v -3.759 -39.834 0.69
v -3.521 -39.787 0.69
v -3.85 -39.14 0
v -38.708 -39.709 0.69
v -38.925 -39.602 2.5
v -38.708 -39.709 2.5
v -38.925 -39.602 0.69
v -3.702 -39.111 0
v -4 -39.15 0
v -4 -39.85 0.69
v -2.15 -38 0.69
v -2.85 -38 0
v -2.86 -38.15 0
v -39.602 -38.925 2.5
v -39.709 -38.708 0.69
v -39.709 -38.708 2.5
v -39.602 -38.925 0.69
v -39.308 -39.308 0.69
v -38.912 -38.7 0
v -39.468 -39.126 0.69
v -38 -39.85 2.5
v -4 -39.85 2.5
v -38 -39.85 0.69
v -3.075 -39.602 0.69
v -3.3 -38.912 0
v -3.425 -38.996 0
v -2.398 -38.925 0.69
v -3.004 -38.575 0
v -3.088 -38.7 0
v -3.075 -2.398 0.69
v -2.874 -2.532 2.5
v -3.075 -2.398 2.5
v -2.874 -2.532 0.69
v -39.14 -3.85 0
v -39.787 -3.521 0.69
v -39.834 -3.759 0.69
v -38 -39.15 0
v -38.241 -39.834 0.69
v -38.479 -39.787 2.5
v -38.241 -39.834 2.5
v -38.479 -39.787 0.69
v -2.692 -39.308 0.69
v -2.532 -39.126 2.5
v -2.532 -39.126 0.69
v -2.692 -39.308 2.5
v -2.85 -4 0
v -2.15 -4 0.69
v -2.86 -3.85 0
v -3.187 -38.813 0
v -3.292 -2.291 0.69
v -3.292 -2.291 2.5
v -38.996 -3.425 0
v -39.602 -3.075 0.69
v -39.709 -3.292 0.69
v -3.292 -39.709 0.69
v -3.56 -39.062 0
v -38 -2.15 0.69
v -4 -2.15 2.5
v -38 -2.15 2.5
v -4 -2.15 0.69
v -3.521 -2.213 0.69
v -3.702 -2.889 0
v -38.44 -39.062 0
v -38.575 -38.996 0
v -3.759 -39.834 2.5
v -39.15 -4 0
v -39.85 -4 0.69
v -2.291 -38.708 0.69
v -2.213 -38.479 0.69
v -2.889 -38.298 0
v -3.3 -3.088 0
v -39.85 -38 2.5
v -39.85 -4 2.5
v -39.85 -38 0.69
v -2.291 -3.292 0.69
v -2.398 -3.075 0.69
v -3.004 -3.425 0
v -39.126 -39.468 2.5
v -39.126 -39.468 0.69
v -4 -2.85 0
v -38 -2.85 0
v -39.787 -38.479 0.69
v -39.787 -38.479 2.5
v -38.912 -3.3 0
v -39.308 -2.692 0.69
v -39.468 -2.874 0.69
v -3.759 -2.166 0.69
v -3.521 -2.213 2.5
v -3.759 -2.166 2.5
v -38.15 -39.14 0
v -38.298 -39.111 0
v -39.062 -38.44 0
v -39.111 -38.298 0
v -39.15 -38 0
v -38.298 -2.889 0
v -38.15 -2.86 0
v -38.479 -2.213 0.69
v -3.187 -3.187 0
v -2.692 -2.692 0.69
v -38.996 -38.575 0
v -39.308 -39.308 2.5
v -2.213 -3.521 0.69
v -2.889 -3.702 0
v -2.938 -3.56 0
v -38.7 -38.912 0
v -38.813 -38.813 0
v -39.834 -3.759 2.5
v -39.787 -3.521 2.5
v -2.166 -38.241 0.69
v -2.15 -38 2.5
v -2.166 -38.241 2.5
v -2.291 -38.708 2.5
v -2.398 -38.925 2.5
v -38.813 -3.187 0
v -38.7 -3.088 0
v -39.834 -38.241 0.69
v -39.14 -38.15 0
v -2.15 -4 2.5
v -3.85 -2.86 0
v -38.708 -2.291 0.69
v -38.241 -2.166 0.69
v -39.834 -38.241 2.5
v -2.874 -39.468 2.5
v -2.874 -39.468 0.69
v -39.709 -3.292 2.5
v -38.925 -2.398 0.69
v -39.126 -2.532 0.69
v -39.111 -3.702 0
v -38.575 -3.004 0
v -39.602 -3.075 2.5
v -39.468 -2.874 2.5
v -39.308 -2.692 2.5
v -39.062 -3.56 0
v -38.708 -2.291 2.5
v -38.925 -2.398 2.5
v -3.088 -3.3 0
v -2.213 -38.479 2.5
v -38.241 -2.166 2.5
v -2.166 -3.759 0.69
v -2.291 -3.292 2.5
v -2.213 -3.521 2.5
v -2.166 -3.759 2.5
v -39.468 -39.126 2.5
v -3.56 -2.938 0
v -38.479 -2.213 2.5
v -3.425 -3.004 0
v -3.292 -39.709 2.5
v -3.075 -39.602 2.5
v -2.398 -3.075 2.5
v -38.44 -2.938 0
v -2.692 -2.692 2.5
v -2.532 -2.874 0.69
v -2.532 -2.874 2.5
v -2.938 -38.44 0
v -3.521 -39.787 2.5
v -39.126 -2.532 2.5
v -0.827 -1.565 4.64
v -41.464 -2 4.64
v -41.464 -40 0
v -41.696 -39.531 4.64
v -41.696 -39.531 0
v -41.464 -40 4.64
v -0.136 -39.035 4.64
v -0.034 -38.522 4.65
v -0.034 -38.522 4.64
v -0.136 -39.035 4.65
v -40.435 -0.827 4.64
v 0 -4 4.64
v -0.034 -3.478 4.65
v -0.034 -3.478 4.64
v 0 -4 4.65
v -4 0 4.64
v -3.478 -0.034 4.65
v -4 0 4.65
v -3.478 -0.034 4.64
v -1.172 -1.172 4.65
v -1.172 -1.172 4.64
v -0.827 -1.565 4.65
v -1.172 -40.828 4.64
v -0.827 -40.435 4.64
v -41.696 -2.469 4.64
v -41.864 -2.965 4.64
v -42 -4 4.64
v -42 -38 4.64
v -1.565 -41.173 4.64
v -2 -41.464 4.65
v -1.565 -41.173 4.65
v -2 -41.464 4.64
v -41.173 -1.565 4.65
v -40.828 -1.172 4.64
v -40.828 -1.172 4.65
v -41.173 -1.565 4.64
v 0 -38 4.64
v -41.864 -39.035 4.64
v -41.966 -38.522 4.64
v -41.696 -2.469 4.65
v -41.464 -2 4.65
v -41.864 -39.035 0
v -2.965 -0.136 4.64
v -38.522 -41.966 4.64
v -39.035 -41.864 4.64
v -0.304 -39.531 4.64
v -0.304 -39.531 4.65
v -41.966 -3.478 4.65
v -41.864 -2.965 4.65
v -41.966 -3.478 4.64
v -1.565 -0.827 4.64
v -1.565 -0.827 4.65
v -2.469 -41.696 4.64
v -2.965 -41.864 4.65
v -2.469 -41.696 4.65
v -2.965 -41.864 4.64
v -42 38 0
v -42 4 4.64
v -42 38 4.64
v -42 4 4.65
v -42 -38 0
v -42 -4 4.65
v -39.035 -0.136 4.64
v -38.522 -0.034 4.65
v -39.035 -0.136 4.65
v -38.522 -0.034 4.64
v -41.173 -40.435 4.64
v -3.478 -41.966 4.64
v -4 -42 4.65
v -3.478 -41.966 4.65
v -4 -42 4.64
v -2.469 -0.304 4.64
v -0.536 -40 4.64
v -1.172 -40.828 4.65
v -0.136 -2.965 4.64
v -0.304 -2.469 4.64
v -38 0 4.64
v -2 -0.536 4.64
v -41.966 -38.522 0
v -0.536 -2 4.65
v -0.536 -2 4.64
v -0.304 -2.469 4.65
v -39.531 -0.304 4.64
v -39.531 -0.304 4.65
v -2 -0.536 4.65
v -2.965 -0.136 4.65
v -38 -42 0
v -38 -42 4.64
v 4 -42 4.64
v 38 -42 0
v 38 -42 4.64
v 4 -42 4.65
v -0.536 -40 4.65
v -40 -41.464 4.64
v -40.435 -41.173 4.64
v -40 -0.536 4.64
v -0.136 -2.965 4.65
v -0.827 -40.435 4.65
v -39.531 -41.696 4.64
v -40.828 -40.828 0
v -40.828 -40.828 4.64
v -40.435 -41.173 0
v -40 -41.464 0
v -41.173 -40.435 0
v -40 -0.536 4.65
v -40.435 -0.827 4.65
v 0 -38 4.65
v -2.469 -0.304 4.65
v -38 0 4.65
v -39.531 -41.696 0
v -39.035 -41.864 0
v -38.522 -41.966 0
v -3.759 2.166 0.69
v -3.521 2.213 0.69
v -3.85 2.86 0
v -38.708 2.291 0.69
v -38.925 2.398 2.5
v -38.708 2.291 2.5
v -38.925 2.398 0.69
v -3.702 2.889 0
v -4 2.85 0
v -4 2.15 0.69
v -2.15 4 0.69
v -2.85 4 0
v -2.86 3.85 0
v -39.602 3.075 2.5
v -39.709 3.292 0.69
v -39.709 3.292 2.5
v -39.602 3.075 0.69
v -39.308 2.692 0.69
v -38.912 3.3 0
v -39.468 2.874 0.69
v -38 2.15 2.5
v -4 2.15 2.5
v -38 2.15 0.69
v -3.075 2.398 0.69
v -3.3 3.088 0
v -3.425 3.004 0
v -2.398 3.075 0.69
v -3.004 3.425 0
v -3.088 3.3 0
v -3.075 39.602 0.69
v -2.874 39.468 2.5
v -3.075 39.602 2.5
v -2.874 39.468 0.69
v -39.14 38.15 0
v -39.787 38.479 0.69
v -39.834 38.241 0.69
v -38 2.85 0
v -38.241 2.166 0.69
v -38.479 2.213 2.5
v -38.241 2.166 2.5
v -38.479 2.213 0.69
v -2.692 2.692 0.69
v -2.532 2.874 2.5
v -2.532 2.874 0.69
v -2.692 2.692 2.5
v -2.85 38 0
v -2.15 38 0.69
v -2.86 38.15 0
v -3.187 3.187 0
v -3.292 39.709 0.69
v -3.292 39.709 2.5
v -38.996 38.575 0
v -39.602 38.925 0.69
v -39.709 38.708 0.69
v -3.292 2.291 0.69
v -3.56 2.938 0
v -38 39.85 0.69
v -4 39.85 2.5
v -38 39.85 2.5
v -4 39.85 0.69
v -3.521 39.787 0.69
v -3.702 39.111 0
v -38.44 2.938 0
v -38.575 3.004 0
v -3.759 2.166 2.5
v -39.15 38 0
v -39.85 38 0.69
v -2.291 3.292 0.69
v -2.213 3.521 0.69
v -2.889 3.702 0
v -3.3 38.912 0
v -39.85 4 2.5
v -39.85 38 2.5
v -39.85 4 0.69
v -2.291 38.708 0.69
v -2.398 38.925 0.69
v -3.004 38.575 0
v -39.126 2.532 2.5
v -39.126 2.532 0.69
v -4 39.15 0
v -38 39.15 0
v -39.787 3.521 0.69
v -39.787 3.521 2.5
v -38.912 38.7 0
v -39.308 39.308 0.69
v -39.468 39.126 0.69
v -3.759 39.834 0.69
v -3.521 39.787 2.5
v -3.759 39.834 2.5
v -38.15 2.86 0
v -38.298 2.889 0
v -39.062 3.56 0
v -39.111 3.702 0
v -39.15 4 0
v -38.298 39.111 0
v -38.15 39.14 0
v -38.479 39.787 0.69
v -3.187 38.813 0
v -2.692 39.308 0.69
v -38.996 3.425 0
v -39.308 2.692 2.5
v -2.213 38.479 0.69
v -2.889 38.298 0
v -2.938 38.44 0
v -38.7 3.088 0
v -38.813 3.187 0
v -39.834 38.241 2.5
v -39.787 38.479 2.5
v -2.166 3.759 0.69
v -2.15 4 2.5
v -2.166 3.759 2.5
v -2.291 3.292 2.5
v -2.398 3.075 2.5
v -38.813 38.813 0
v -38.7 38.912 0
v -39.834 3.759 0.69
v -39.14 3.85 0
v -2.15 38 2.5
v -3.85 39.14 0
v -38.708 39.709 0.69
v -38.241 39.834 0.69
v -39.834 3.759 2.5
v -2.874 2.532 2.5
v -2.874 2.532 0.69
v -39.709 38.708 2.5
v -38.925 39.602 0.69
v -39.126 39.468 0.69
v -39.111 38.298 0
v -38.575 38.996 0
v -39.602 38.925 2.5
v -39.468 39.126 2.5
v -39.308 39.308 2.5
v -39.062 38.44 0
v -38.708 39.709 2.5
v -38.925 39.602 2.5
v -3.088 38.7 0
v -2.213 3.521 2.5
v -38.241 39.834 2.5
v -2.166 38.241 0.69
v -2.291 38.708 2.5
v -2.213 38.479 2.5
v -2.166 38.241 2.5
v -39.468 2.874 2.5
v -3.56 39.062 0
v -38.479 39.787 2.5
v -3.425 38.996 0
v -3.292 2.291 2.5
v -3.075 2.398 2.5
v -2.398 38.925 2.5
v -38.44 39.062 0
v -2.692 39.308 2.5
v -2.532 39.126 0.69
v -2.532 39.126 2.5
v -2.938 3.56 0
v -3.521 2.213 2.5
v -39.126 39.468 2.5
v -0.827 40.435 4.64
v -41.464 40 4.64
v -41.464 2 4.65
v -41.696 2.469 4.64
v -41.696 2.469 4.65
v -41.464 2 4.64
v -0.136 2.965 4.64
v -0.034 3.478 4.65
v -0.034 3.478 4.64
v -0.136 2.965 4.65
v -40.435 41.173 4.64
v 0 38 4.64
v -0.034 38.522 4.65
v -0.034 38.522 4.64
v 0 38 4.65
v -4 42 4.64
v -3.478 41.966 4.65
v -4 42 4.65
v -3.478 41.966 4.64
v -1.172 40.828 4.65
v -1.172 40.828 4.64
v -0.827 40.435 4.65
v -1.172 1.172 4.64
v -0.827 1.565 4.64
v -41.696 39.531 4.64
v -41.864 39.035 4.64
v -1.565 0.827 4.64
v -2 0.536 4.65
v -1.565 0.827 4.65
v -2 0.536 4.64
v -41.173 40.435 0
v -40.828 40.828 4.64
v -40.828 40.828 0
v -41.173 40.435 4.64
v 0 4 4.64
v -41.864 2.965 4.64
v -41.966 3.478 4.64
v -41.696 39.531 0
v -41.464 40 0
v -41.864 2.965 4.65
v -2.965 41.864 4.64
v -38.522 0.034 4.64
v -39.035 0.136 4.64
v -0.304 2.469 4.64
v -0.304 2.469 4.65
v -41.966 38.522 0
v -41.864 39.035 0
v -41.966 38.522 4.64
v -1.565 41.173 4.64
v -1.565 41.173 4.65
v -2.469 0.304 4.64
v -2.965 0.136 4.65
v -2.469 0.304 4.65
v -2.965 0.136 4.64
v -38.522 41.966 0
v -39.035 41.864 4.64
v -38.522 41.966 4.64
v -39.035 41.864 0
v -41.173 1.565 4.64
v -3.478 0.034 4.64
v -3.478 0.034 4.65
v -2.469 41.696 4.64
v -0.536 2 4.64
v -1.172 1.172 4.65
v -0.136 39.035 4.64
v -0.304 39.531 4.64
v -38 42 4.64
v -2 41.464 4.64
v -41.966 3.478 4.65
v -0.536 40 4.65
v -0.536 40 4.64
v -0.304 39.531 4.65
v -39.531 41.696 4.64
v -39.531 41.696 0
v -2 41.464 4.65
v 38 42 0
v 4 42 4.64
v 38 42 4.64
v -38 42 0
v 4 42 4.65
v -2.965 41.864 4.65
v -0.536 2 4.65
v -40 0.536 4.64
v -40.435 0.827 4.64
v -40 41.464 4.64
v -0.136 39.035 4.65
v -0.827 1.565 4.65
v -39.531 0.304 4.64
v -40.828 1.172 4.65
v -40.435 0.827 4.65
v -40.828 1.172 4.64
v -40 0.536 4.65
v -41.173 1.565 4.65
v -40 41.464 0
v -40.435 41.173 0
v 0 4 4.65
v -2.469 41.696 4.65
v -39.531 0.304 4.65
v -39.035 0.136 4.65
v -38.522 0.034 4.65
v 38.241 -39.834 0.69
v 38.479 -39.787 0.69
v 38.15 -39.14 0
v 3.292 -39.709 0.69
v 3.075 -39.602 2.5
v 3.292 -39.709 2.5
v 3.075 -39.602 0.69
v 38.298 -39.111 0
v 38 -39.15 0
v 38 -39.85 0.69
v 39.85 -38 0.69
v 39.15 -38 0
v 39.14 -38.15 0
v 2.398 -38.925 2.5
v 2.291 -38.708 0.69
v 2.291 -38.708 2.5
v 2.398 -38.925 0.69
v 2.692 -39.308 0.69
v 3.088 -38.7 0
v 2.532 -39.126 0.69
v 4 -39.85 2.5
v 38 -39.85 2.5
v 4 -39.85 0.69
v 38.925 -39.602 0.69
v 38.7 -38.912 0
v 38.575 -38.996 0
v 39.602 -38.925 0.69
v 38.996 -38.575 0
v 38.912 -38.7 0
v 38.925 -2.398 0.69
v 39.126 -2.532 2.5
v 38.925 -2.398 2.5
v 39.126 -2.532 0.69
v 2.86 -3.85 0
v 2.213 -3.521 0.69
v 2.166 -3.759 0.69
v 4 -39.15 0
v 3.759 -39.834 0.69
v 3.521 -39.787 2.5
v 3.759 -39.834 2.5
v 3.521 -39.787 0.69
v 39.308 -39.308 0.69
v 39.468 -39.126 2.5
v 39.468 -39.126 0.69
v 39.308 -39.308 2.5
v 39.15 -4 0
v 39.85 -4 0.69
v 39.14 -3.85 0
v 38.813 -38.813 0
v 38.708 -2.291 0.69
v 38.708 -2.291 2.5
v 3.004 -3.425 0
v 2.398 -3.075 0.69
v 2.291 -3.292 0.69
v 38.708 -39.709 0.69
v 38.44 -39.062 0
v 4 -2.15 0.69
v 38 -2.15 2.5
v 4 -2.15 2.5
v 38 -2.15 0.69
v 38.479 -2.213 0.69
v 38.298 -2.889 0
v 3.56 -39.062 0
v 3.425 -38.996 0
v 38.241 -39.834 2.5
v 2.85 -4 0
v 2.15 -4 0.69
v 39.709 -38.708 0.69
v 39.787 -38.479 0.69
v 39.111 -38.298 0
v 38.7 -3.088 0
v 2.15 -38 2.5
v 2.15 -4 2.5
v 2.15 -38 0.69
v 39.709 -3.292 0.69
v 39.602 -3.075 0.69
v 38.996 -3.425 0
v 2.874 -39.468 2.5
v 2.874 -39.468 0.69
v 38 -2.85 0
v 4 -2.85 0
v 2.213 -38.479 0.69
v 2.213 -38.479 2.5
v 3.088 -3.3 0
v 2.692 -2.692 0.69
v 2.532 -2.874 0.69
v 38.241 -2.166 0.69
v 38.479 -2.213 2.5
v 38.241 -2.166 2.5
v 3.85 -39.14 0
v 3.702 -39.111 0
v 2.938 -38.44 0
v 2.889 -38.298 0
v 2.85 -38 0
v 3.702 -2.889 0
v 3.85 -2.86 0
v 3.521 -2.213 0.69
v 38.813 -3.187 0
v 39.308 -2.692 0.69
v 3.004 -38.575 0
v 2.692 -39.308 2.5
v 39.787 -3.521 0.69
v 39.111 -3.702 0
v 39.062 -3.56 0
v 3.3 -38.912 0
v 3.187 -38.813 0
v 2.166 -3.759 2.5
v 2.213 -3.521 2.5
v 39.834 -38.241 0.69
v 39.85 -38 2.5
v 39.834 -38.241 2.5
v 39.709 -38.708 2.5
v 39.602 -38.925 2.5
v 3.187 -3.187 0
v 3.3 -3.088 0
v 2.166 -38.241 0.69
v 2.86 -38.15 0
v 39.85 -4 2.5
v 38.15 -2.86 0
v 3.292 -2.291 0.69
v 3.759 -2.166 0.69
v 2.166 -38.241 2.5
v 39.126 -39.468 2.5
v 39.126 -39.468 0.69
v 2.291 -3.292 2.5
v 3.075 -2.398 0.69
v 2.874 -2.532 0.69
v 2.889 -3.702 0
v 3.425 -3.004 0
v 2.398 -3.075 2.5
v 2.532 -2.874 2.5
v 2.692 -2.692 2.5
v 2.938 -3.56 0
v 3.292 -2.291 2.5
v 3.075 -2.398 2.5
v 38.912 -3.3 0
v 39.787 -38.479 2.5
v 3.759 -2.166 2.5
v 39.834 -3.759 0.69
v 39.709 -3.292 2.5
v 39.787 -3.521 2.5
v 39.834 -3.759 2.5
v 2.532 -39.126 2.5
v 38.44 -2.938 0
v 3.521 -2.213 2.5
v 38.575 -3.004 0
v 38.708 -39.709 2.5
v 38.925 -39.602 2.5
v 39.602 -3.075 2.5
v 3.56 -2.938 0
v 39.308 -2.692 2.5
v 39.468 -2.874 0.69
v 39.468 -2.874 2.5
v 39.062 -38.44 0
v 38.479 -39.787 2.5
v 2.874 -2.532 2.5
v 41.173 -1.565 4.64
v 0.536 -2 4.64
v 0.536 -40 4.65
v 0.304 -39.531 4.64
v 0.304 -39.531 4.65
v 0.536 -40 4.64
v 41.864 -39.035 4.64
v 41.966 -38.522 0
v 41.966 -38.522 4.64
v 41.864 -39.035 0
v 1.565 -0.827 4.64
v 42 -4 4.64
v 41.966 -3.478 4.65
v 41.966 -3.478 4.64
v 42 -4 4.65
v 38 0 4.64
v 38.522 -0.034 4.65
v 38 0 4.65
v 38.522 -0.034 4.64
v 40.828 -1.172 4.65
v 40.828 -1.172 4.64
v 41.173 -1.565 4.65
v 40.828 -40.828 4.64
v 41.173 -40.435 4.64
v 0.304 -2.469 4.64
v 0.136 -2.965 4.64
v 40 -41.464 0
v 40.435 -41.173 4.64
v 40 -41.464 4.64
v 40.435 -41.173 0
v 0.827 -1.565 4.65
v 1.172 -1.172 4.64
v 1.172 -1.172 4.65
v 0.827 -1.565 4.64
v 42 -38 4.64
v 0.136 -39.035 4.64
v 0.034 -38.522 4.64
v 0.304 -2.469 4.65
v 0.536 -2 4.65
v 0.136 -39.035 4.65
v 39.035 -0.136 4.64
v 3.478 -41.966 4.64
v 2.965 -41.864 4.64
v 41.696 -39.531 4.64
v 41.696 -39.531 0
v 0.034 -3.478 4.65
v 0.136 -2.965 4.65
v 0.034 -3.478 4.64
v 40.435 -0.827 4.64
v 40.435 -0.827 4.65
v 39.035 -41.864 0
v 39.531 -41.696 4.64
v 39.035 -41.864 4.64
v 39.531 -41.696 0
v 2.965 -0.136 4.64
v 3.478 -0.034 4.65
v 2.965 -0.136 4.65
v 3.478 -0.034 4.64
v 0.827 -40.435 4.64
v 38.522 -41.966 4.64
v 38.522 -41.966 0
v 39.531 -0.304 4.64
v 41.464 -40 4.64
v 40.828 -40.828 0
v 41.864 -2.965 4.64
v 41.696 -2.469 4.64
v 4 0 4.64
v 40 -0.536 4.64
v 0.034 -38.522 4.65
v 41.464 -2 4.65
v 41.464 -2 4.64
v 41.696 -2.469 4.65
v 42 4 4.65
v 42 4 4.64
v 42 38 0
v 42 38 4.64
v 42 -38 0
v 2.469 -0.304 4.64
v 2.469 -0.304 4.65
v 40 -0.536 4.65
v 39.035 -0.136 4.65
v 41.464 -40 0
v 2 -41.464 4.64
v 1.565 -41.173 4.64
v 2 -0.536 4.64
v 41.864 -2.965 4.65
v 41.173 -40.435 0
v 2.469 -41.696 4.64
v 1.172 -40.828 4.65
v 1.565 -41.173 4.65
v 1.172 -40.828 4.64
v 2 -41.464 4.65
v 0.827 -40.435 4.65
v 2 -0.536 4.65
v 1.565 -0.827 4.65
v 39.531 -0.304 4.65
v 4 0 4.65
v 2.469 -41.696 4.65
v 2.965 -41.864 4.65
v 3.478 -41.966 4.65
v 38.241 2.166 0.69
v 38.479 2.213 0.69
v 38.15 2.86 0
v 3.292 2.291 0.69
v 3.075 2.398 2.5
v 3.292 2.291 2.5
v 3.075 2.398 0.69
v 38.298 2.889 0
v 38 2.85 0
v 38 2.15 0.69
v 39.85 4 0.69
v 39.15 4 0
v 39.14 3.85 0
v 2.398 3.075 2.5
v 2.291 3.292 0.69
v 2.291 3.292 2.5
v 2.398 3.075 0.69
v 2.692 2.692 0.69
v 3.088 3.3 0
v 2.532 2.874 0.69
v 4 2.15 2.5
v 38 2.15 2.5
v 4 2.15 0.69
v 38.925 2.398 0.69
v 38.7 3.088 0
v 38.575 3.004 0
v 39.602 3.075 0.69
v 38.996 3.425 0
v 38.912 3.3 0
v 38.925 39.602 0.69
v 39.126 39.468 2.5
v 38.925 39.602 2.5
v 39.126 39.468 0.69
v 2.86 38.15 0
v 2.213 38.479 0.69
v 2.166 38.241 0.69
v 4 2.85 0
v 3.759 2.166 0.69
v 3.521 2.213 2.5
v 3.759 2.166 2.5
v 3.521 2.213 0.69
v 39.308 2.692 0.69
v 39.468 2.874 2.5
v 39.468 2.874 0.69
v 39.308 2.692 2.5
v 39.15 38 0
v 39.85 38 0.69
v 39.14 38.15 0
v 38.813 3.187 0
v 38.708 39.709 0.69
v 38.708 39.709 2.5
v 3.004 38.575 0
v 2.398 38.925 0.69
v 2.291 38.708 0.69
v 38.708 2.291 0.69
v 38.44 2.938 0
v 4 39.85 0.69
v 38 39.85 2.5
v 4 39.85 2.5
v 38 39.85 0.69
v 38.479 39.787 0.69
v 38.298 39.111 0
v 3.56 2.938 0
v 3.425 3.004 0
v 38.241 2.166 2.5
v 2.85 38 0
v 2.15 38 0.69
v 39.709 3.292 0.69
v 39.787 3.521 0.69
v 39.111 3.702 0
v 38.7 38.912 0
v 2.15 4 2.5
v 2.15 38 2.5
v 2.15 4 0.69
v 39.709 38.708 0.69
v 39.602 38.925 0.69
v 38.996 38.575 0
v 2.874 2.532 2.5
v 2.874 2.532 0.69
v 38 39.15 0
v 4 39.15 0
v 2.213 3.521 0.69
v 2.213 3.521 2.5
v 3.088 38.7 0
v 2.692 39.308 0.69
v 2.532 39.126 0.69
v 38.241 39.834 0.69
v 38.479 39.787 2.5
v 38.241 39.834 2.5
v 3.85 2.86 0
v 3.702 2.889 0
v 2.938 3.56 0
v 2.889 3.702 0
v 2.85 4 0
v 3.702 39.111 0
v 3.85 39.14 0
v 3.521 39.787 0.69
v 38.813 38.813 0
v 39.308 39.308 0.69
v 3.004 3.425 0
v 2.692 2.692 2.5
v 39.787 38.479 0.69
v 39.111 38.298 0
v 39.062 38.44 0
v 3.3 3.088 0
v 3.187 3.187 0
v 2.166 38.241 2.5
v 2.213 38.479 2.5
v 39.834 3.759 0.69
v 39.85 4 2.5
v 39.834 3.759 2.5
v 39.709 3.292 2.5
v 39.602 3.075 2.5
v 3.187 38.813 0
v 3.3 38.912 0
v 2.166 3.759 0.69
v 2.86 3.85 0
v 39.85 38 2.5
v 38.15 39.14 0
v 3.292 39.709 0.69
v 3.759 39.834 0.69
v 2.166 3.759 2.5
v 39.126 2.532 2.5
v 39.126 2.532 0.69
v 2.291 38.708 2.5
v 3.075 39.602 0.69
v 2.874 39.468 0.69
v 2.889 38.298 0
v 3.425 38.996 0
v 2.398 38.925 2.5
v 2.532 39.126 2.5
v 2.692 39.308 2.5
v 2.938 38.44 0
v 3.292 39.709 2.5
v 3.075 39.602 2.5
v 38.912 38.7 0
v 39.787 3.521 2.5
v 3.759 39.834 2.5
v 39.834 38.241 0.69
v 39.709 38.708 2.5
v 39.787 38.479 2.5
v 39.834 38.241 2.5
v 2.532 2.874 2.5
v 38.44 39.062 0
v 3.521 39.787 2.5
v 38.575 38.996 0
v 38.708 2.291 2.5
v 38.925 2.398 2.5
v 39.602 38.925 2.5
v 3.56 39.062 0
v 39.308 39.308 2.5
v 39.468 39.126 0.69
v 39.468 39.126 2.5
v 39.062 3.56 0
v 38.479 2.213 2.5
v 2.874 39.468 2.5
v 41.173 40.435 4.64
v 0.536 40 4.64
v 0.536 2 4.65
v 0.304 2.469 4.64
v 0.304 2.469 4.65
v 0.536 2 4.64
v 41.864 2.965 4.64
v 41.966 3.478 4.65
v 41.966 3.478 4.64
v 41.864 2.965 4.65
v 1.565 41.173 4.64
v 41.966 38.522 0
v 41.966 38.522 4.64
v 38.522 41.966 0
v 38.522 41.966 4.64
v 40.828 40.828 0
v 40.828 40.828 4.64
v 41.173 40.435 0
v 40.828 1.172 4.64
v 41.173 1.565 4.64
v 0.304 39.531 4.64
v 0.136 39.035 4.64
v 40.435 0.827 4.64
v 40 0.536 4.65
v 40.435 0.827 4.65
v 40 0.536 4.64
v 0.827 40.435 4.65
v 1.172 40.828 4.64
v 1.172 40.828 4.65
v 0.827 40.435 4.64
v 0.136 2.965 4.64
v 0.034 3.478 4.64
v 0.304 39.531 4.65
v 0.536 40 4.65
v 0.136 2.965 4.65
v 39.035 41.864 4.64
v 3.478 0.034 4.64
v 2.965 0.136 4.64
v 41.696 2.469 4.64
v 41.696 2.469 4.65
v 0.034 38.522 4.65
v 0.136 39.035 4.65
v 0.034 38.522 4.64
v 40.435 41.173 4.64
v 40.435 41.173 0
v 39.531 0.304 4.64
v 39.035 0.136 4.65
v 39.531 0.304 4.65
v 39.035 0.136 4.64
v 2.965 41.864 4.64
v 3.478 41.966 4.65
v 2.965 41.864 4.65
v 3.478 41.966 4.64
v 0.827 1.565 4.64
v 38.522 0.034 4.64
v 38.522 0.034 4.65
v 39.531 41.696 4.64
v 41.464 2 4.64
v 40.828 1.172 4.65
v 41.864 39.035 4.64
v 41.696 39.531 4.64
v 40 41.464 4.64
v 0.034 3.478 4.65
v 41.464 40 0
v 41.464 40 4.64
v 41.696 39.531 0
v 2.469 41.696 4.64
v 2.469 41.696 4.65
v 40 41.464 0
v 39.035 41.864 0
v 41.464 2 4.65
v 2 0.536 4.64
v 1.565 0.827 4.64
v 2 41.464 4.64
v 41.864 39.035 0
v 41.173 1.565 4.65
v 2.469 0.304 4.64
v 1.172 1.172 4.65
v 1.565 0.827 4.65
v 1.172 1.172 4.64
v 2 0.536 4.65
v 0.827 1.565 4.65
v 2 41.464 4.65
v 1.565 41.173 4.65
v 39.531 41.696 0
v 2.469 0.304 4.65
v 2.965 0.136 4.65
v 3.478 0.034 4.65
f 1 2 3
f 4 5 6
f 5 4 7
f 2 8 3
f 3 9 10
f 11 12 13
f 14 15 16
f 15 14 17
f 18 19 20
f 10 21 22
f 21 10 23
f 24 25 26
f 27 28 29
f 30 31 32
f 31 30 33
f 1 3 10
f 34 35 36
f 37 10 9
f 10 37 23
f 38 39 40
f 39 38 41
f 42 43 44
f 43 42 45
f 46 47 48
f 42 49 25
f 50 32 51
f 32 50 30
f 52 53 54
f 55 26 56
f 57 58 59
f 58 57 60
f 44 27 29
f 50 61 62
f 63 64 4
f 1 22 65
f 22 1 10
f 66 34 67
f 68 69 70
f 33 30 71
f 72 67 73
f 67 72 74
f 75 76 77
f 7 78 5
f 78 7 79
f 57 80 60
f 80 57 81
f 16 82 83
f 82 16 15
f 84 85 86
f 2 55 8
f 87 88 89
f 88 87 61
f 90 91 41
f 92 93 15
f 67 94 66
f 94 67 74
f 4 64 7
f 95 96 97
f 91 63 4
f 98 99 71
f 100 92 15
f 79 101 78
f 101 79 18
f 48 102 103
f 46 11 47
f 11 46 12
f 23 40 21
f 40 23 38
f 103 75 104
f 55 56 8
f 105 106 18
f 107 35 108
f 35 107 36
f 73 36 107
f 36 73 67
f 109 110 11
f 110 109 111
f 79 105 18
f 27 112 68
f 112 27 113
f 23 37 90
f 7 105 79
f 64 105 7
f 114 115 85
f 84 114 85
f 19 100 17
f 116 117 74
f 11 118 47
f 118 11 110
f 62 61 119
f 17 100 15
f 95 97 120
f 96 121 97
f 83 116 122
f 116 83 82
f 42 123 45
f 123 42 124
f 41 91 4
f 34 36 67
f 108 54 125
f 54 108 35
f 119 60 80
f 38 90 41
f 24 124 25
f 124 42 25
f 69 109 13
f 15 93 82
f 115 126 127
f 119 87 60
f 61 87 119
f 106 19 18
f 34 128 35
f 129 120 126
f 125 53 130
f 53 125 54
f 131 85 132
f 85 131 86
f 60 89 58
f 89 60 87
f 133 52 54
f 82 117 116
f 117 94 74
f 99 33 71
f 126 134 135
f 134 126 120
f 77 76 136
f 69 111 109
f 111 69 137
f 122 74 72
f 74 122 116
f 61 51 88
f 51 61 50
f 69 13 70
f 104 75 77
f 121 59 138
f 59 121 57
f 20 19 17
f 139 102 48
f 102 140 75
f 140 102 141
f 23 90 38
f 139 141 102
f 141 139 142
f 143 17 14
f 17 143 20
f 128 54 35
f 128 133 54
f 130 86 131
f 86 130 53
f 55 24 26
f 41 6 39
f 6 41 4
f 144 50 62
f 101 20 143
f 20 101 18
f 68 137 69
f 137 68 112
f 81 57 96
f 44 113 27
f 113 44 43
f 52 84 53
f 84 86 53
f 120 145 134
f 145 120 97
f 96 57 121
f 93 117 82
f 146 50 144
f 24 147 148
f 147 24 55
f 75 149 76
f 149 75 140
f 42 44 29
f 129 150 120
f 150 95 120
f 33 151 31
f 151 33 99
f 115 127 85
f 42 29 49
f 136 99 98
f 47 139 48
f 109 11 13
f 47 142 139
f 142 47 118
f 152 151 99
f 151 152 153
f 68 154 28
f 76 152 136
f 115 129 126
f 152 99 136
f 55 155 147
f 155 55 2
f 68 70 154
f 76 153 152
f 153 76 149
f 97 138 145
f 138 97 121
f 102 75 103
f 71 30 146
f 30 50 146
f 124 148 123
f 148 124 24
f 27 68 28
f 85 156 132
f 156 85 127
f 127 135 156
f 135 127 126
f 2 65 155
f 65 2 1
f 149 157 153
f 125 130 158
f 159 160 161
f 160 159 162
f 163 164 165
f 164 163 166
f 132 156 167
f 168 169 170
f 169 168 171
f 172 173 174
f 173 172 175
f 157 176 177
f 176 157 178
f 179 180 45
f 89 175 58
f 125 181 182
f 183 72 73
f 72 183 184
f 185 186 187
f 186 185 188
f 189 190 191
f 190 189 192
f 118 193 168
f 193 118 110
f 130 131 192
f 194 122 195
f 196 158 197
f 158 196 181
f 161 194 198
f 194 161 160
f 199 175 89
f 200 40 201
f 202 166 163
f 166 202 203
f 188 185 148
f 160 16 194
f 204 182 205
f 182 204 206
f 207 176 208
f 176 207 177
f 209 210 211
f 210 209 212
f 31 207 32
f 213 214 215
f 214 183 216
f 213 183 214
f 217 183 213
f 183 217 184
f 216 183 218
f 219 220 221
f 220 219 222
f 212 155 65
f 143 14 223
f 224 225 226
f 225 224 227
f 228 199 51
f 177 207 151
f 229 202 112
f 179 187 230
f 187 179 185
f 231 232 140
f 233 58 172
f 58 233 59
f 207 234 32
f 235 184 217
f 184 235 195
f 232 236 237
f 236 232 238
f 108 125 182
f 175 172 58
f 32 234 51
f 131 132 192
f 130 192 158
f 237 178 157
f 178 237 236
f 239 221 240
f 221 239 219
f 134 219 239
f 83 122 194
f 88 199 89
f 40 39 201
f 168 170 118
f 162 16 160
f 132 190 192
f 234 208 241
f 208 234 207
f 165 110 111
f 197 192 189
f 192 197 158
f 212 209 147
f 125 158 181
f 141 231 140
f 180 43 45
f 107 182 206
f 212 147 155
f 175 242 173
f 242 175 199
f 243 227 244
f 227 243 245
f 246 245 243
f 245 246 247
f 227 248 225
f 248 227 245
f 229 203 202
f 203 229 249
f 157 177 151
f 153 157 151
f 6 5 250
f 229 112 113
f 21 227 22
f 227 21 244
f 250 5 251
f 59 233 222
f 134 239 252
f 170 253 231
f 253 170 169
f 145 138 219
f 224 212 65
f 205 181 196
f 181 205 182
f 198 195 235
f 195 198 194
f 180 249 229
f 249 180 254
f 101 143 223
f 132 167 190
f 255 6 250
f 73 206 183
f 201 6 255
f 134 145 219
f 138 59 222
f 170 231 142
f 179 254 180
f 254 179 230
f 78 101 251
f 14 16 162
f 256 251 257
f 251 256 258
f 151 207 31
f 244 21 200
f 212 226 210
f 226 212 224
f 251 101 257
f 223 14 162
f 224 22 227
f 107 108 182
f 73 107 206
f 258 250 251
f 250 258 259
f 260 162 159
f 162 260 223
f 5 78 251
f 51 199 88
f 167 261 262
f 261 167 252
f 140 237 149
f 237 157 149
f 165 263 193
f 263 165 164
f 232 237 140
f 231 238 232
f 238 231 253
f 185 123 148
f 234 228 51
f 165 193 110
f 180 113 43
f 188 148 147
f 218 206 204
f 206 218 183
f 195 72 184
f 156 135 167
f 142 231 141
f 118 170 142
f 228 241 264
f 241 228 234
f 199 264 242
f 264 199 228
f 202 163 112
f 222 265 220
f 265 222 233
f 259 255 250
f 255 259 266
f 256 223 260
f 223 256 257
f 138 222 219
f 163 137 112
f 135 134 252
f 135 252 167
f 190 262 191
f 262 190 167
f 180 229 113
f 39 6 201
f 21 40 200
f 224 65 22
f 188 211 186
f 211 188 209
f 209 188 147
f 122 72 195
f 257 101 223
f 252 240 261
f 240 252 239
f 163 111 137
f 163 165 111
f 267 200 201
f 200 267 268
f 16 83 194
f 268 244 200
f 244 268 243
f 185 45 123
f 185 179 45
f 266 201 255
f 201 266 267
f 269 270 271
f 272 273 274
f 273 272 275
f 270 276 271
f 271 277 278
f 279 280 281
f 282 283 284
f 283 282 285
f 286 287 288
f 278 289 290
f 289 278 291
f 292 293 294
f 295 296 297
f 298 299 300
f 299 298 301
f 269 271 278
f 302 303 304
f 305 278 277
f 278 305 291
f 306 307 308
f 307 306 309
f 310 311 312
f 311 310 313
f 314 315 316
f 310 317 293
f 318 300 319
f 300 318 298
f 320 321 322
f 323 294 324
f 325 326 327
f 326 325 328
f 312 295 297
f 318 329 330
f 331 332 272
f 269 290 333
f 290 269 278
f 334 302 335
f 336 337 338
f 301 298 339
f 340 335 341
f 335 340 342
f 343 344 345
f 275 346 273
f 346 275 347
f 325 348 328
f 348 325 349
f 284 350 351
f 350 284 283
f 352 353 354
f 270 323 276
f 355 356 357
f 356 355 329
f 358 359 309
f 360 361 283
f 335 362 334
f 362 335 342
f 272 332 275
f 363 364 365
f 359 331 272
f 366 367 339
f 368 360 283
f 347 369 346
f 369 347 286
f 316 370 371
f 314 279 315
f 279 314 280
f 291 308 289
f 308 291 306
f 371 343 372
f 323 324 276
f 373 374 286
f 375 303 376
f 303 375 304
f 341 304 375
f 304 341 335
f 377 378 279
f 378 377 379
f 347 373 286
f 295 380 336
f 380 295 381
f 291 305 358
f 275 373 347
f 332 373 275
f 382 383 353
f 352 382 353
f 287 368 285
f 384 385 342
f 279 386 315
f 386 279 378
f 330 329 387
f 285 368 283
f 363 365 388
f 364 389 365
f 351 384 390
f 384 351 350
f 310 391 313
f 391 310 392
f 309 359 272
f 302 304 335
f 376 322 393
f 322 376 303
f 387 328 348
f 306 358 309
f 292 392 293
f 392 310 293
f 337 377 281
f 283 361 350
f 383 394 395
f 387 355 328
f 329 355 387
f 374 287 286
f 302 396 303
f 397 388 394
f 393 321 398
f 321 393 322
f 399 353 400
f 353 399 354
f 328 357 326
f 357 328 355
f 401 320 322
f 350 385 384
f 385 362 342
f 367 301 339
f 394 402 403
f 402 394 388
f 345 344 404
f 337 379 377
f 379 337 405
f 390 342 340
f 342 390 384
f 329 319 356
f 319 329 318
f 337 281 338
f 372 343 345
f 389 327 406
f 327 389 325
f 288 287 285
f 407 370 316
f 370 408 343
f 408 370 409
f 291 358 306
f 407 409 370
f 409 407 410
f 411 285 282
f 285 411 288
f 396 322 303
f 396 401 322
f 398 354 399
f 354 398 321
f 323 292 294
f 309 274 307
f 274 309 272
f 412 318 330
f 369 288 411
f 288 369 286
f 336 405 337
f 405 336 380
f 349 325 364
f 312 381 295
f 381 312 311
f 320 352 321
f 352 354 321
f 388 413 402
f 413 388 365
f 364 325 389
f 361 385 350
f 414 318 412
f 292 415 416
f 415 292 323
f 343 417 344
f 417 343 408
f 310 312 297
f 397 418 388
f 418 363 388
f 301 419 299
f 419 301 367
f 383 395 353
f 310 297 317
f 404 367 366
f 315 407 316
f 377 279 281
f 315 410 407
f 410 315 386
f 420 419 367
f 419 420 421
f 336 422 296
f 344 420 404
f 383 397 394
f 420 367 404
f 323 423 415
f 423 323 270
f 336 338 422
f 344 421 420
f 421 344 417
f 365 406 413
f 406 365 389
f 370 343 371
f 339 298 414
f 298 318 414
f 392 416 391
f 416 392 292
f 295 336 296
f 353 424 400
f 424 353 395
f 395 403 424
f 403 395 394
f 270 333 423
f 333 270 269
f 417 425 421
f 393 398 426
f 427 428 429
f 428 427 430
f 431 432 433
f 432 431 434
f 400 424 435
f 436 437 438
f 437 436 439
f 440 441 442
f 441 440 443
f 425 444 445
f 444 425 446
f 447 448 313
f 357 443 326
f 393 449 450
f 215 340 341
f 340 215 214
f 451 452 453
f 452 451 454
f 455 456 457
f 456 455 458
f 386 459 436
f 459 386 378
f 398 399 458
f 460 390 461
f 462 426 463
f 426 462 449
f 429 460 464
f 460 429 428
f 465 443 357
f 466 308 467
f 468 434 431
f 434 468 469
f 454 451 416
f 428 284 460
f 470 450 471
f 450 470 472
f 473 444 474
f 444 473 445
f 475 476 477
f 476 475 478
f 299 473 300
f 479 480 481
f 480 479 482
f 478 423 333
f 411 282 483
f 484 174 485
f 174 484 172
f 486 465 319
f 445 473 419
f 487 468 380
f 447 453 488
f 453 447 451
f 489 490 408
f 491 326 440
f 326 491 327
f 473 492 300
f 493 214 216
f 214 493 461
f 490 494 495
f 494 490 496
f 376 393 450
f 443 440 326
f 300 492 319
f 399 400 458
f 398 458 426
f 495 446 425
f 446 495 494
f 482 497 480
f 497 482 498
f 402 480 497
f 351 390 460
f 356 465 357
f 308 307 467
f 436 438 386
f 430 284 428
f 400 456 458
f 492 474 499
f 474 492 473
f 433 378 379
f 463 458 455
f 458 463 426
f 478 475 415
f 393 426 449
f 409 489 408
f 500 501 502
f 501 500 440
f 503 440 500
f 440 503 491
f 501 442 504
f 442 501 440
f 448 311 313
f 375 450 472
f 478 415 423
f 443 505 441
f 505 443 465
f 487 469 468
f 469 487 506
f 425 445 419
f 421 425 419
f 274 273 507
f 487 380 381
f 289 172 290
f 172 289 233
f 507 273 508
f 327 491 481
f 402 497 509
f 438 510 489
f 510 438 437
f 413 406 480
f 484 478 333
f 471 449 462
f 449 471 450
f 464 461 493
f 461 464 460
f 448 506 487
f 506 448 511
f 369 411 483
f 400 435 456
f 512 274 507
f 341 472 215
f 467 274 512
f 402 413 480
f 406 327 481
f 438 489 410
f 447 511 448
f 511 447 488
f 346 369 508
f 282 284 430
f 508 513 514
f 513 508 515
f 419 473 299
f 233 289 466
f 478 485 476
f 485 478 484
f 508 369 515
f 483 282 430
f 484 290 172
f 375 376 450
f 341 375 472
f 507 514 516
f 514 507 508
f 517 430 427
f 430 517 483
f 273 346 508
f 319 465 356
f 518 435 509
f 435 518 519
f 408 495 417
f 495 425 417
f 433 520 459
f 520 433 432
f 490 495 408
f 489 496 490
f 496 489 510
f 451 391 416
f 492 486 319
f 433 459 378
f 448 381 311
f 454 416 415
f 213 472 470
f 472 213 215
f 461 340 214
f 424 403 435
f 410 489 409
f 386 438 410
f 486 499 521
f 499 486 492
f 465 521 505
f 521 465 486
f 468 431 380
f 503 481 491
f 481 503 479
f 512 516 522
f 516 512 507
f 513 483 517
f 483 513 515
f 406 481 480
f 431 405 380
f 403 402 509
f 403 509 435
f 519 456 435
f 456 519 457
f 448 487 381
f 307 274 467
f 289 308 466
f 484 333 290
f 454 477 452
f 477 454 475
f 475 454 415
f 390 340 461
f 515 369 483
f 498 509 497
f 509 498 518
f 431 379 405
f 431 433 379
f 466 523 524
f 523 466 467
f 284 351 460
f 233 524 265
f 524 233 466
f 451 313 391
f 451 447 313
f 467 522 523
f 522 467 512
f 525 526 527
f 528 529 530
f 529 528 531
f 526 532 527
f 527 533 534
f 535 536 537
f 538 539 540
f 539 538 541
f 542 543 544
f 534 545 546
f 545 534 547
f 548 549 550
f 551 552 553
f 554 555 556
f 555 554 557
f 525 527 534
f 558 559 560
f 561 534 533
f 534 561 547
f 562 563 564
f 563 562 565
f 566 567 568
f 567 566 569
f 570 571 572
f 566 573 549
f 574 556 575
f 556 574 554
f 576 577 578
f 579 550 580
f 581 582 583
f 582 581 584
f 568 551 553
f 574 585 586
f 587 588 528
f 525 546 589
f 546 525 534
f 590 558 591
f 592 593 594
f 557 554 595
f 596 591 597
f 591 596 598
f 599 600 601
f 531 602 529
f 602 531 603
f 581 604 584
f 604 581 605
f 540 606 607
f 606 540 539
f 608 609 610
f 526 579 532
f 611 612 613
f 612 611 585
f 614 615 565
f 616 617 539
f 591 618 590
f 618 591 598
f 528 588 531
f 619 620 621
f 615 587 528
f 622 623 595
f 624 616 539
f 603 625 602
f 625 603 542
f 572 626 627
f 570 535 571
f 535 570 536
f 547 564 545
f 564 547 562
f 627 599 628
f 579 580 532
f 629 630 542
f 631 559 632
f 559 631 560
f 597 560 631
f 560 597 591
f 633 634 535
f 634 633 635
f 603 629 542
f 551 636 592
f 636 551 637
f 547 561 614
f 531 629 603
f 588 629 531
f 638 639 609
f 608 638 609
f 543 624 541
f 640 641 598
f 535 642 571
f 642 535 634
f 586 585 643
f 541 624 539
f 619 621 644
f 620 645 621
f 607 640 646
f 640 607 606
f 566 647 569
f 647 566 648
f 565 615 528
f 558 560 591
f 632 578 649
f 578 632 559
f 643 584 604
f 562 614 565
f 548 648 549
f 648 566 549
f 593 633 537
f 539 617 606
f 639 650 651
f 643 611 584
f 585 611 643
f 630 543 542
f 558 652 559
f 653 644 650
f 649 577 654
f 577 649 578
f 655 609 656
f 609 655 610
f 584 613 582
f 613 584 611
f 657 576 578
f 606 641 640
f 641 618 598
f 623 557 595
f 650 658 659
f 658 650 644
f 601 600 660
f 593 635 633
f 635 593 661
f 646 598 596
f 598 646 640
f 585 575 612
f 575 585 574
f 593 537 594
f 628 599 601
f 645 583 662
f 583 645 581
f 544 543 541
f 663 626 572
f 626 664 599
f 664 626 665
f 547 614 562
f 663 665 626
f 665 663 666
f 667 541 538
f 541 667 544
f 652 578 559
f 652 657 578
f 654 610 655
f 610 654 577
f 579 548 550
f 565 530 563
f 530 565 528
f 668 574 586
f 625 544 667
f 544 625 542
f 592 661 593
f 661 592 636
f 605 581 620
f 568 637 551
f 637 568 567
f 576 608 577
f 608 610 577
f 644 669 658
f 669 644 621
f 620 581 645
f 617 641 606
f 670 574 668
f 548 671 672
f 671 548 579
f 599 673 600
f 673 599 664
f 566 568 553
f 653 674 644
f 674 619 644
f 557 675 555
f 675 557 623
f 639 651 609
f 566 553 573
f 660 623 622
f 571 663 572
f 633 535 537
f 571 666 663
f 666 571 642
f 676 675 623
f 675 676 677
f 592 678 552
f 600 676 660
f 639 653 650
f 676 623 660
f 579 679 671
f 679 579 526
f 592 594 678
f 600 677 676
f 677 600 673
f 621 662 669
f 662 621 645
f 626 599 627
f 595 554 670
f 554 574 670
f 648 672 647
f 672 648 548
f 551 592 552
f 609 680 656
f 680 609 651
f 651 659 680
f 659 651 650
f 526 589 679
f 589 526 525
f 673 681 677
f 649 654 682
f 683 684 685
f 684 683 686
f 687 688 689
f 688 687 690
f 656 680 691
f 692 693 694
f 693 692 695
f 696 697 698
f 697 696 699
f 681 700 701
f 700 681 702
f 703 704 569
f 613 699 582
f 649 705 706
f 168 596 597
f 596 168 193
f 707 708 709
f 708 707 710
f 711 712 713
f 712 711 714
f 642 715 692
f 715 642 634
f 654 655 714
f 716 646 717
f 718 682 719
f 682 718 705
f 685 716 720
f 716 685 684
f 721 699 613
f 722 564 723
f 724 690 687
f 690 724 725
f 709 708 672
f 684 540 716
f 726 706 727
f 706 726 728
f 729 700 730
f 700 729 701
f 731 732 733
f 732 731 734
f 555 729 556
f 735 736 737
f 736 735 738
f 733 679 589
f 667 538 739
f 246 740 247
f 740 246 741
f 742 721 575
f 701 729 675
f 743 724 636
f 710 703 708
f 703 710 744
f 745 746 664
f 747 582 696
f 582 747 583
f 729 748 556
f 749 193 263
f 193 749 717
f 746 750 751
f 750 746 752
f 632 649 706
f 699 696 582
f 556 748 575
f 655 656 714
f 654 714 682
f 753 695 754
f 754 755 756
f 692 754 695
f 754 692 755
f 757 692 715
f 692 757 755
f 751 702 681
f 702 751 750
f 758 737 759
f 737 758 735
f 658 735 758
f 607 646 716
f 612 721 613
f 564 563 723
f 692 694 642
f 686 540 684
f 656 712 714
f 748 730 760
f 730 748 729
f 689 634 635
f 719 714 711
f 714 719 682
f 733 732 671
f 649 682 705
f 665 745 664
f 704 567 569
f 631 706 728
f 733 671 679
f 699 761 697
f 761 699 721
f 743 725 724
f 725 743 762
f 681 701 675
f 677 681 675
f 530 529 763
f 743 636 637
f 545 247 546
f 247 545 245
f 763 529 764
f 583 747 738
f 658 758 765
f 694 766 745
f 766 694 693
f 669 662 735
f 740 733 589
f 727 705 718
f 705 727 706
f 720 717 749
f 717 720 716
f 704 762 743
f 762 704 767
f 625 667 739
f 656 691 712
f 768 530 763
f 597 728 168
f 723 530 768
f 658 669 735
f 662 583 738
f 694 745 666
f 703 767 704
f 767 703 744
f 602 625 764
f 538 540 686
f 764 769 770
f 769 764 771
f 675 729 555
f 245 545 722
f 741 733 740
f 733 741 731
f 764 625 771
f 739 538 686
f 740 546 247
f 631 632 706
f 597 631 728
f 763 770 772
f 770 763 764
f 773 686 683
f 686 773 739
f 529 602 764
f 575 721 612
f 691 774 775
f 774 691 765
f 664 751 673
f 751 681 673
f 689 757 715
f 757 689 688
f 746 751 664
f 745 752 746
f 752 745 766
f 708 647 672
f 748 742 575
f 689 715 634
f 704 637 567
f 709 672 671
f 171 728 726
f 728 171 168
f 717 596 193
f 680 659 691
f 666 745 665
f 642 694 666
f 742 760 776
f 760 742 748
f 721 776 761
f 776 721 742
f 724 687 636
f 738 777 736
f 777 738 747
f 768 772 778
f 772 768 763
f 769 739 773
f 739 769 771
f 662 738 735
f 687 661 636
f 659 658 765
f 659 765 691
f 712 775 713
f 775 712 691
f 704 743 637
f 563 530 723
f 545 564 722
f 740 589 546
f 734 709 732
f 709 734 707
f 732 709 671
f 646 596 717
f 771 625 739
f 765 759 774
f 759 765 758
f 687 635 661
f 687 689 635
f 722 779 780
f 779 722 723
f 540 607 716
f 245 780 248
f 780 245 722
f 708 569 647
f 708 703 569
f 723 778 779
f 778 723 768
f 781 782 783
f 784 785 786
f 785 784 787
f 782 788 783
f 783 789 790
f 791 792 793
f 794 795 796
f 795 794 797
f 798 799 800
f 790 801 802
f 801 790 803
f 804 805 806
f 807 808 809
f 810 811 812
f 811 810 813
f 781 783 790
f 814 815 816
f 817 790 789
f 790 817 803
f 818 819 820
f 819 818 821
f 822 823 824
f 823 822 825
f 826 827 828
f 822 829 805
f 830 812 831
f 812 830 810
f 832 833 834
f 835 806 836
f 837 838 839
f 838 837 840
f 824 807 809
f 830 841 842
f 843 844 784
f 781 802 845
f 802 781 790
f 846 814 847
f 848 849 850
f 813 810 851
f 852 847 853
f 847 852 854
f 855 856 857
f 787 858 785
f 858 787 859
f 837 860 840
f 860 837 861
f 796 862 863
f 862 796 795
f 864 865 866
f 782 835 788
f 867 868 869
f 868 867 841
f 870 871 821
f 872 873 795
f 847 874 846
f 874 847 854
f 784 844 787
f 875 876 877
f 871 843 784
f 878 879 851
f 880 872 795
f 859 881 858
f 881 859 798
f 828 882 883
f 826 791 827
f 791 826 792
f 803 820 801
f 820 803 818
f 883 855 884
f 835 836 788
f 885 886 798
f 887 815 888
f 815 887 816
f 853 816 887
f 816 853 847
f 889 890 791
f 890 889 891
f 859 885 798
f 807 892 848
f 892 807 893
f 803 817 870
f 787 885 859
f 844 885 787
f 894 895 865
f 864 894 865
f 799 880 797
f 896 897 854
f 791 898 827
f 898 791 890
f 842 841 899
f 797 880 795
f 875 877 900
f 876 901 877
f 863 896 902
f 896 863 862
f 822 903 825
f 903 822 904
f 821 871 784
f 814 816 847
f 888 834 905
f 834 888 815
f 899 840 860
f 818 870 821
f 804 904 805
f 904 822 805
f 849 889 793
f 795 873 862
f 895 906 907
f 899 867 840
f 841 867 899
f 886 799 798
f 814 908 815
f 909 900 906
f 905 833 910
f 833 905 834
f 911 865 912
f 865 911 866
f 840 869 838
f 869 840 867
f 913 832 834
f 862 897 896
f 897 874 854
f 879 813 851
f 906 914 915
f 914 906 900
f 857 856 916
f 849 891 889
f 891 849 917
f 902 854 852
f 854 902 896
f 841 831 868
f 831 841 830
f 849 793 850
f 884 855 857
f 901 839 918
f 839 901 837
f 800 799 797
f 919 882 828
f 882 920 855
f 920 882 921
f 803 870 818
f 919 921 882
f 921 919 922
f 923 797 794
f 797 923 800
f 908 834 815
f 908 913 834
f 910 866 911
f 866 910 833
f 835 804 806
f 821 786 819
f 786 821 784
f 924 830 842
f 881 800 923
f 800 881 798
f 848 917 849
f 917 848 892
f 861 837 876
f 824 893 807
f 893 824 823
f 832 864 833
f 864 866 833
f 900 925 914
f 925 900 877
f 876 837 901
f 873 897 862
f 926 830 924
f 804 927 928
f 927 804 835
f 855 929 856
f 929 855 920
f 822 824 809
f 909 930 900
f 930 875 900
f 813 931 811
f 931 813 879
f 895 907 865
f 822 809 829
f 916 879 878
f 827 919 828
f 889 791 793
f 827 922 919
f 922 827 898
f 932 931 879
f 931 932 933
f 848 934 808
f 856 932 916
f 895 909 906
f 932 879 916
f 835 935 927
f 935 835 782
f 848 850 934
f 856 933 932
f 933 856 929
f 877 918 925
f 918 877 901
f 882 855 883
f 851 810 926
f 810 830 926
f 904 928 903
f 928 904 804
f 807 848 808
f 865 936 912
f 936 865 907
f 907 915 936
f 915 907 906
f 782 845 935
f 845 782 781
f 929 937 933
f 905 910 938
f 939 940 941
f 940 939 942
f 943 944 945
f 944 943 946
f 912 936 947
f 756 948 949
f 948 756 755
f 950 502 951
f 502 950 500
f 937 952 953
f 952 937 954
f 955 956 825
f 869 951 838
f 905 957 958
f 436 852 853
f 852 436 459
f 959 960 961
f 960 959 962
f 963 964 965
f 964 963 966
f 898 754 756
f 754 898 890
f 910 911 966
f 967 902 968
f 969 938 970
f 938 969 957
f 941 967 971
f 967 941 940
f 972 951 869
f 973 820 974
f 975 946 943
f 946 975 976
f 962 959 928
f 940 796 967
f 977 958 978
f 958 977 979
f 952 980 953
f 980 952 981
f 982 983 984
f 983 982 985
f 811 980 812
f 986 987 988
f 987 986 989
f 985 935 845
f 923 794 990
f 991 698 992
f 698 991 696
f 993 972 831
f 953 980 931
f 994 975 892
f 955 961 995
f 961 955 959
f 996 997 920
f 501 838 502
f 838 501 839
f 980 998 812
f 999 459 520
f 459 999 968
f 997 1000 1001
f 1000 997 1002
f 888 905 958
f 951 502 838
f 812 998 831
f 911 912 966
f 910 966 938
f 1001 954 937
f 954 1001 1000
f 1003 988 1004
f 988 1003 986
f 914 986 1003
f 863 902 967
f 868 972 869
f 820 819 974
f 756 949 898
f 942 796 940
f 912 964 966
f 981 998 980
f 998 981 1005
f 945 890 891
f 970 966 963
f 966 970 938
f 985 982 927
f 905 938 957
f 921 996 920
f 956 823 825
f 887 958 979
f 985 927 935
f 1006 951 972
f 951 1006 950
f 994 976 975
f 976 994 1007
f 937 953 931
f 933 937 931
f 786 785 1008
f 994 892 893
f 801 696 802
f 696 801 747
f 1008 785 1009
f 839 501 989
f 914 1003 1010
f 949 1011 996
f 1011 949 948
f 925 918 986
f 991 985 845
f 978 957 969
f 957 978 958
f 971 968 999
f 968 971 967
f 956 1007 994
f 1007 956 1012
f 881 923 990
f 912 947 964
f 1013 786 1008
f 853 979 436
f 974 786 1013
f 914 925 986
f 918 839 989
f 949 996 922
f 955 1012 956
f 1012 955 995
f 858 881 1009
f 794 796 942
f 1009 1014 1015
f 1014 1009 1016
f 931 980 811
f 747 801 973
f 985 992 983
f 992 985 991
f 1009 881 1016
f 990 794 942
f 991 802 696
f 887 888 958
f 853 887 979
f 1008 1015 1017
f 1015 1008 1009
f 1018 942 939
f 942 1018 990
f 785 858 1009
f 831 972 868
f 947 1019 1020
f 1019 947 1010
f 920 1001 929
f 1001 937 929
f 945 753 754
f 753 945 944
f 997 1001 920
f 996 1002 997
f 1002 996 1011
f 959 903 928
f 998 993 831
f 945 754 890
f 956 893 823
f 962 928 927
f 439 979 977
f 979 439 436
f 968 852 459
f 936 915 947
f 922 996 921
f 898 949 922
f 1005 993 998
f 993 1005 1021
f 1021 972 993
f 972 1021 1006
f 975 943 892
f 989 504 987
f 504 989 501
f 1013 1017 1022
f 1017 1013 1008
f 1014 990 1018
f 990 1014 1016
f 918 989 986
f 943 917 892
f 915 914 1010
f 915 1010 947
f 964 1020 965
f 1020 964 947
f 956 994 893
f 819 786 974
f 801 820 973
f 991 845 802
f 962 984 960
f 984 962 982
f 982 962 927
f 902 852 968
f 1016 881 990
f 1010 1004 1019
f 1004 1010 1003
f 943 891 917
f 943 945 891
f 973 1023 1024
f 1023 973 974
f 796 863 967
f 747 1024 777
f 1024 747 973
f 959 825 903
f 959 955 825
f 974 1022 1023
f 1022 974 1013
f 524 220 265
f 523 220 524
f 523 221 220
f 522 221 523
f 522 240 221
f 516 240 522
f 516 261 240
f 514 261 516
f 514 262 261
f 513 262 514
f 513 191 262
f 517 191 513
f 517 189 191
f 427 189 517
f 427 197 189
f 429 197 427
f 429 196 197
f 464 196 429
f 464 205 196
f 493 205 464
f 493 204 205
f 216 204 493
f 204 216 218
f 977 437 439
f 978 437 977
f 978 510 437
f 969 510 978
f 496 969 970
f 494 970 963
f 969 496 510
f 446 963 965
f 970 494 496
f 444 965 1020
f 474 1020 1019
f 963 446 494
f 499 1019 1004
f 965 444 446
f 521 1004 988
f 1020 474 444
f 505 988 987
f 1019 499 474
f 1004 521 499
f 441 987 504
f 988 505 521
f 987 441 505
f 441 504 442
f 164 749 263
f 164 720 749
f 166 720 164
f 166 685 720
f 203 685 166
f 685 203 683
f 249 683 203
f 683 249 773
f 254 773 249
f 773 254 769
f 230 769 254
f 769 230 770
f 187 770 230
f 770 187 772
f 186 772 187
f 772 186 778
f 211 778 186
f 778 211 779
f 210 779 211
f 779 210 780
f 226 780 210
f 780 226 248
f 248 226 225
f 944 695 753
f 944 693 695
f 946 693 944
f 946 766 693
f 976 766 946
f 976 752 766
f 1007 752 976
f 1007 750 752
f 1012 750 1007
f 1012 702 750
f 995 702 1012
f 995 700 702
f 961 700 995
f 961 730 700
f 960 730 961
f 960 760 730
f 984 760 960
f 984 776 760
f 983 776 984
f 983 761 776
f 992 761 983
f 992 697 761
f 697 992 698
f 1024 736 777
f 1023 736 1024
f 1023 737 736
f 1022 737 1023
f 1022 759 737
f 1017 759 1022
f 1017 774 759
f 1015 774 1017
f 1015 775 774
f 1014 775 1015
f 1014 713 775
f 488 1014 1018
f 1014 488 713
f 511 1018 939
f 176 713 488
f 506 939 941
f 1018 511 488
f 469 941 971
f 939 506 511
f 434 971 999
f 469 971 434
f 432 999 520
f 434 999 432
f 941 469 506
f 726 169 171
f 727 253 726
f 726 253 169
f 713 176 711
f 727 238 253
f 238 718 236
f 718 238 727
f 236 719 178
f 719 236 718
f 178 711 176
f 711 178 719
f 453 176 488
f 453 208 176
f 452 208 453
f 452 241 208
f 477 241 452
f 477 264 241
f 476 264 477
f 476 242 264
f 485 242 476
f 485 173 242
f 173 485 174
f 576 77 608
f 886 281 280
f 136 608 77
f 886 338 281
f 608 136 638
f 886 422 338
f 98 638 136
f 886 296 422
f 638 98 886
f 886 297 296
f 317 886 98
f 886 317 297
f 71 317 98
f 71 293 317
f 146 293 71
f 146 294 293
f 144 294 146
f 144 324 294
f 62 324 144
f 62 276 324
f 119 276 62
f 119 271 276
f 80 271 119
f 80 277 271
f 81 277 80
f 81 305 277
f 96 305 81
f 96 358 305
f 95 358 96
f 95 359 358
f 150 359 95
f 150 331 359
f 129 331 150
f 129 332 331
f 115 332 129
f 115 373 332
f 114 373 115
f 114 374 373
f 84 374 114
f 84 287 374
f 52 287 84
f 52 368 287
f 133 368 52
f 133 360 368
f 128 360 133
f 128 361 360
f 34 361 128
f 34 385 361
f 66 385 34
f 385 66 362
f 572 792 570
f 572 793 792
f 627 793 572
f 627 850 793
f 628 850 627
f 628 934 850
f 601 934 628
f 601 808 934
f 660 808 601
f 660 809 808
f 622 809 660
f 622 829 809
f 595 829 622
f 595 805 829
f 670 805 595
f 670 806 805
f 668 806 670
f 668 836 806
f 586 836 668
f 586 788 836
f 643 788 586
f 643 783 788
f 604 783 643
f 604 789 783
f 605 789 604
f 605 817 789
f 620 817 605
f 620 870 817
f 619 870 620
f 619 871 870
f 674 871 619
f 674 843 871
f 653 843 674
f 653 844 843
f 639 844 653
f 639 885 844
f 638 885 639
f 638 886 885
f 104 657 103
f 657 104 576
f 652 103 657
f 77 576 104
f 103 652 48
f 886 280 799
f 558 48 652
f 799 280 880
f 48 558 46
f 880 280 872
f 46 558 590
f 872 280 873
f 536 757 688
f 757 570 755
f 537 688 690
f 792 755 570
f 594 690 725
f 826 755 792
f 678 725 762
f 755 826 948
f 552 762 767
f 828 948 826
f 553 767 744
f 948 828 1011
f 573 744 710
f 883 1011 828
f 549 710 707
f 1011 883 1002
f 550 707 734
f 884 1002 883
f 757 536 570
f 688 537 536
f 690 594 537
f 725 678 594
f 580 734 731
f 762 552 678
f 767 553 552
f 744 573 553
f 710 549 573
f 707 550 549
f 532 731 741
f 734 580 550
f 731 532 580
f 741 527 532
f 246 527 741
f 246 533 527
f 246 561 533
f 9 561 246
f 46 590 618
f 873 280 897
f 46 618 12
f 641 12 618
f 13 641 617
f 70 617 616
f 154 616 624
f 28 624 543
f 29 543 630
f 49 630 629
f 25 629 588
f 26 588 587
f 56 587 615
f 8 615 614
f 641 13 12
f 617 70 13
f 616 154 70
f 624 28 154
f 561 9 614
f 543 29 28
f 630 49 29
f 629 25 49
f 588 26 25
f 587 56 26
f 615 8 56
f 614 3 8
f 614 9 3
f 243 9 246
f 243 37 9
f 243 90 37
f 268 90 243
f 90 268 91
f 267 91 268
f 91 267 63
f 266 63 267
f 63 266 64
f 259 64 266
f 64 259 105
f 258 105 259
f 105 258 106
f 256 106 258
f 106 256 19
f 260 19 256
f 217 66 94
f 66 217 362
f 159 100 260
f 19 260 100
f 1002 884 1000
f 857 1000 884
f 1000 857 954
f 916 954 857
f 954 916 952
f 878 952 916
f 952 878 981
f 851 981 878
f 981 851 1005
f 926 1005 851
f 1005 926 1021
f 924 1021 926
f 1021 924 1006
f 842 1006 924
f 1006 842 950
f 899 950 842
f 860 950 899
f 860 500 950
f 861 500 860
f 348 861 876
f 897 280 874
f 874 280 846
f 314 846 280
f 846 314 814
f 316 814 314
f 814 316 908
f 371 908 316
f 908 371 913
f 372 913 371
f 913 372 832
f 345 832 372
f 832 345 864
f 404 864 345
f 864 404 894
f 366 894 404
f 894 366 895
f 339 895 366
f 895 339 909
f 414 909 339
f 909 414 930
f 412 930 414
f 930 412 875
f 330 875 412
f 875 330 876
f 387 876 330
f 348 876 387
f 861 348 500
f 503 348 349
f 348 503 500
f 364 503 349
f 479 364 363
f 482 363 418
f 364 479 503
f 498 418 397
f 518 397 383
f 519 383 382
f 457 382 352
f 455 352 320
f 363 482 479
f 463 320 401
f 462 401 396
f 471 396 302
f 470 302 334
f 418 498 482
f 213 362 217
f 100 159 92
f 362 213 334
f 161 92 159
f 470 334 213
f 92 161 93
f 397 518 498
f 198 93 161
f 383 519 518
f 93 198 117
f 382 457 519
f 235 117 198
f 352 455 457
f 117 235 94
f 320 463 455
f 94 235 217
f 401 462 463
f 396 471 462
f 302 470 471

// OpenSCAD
// file: ../lib/profile.scad
// Shared geometry: the foot and socket shapes every part is built from.
include <constants.scad>

// 2D rectangle of the given outer size with rounded corners, centred on the origin.
module rounded_rect(size, r) {
    offset(r = r) square([size.x - 2 * r, size.y - 2 * r], center = true);
}

// Solid whose outline shrinks with height according to `profile`,
// a bottom-to-top list of [z, inset from `size`]. Corner radius follows the inset.
module stepped_solid(size, r, profile) {
    for (i = [0 : len(profile) - 2]) {
        a = profile[i];
        b = profile[i + 1];
        hull() {
            translate([0, 0, a[0]])
                linear_extrude(EPS) rounded_rect(size - 2 * [a[1], a[1]], r - a[1]);
            translate([0, 0, b[0] - EPS])
                linear_extrude(EPS) rounded_rect(size - 2 * [b[1], b[1]], r - b[1]);
        }
    }
}

// One bin foot, sitting on z = 0, centred on its cell.
module foot() {
    stepped_solid([GRID - CLEARANCE, GRID - CLEARANCE], BIN_R, FOOT_PROFILE);
}

// Negative volume a foot drops into. `size` is the full grid area it spans.
// With through = true it is extended above and below so it cuts clean through a plate.
module socket(size = [GRID, GRID], through = false) {
    lo = SOCKET_PROFILE[0];
    hi = SOCKET_PROFILE[len(SOCKET_PROFILE) - 1];
    profile = through
        ? concat([[lo[0] - 1, lo[1]]], SOCKET_PROFILE, [[hi[0] + 1, hi[1]]])
        : SOCKET_PROFILE;
    stepped_solid(size, SOCKET_R, profile);
}

// Repeat children once per cell of an nx-by-ny grid centred on the origin.
module grid_copies(nx, ny) {
    for (i = [0 : nx - 1], j = [0 : ny - 1])
        translate([(i - (nx - 1) / 2) * GRID, (j - (ny - 1) / 2) * GRID, 0])
            children();
}
// file: ../lib/printer.scad
// Printer limits and the logic for splitting large parts to fit the bed.
// Values are for a Bambu Lab P2S; change them here if the printer changes.
include <constants.scad>

BED        = [256, 256, 256];   // build volume, mm
BED_MARGIN = 5;                 // space kept free at each bed edge (5 -> 5x5 cells max, 2 -> 6x6)

// Largest number of whole grid cells that fit along one bed axis (0 = X, 1 = Y).
function max_cells(axis) = floor((BED[axis] - 2 * BED_MARGIN) / GRID);

// True when a part of the given [x, y, z] size fits the bed.
function fits_bed(size) =
    size.x <= BED.x - 2 * BED_MARGIN &&
    size.y <= BED.y - 2 * BED_MARGIN &&
    (len(size) < 3 || size.z <= BED.z);

// Split n cells into the fewest runs of at most `limit` cells, as evenly as possible.
// split_cells(13, 5) -> [5, 4, 4]
function split_cells(n, limit) =
    let (count = ceil(n / limit), base = floor(n / count), extra = n - base * count)
    [for (i = [0 : count - 1]) base + (i < extra ? 1 : 0)];

// Sum of the first `count` entries of a list.
function sum_first(v, count) = count <= 0 ? 0 : v[count - 1] + sum_first(v, count - 1);
// file: ../lib/constants.scad
// Gridfinity standard dimensions (mm). Single source of truth:
// every other file includes this one and never hardcodes these numbers.

GRID      = 42;     // X/Y pitch of one cell
UNIT_Z    = 7;      // height of one "u"
CLEARANCE = 0.5;    // total X/Y gap between a bin and its grid space (0.25 per side)

// Bin foot: stepped chamfer, listed bottom to top as [z, inset from the foot's top outline].
FOOT_PROFILE = [[0, 2.95], [0.8, 2.15], [2.6, 2.15], [4.75, 0]];
FOOT_H       = 4.75;
BIN_R        = 3.75;   // outer corner radius of a bin

// Socket (baseplate cell and stacking lip): [z, inset from the 42 mm grid outline].
SOCKET_PROFILE = [[0, 2.85], [0.7, 2.15], [2.5, 2.15], [4.65, 0]];
SOCKET_H       = 4.65;
SOCKET_R       = 4;    // corner radius at the top of a socket

// Bin body
WALL      = 0.95;   // wall thickness
FLOOR_Z   = 7;      // top of the bin floor, measured from the bottom of the foot
LIP_H     = 4.4;    // nominal stacking-lip height above the bin body
LIP_TRIM  = 0.4;    // shave the knife edge off the lip tip so it prints cleanly
LIP_INSET = SOCKET_PROFILE[0][1] - CLEARANCE / 2;   // lip overhang from the outer wall (2.6)

// Magnets (optional)
MAGNET_D      = 6.5;
MAGNET_H      = 2.4;
MAGNET_OFFSET = 13;   // hole centre distance from the cell centre, in X and Y

EPS = 0.01;   // overlap used to avoid coincident faces in boolean cuts
$fn = 48;
// main file
// Plain Gridfinity baseplate: an open frame of sockets.
include <../lib/constants.scad>
include <../lib/printer.scad>
use <../lib/profile.scad>

/* [Baseplate] */
cells_x = 2;
cells_y = 2;

assert(fits_bed([cells_x * GRID, cells_y * GRID]),
       "Baseplate is larger than the printer bed: use parts/baseplate_tiled.scad");

baseplate(cells_x, cells_y);

module baseplate(nx = 1, ny = 1) {
    difference() {
        linear_extrude(SOCKET_H) rounded_rect([nx * GRID, ny * GRID], SOCKET_R);
        grid_copies(nx, ny) socket(through = true);
    }
}
